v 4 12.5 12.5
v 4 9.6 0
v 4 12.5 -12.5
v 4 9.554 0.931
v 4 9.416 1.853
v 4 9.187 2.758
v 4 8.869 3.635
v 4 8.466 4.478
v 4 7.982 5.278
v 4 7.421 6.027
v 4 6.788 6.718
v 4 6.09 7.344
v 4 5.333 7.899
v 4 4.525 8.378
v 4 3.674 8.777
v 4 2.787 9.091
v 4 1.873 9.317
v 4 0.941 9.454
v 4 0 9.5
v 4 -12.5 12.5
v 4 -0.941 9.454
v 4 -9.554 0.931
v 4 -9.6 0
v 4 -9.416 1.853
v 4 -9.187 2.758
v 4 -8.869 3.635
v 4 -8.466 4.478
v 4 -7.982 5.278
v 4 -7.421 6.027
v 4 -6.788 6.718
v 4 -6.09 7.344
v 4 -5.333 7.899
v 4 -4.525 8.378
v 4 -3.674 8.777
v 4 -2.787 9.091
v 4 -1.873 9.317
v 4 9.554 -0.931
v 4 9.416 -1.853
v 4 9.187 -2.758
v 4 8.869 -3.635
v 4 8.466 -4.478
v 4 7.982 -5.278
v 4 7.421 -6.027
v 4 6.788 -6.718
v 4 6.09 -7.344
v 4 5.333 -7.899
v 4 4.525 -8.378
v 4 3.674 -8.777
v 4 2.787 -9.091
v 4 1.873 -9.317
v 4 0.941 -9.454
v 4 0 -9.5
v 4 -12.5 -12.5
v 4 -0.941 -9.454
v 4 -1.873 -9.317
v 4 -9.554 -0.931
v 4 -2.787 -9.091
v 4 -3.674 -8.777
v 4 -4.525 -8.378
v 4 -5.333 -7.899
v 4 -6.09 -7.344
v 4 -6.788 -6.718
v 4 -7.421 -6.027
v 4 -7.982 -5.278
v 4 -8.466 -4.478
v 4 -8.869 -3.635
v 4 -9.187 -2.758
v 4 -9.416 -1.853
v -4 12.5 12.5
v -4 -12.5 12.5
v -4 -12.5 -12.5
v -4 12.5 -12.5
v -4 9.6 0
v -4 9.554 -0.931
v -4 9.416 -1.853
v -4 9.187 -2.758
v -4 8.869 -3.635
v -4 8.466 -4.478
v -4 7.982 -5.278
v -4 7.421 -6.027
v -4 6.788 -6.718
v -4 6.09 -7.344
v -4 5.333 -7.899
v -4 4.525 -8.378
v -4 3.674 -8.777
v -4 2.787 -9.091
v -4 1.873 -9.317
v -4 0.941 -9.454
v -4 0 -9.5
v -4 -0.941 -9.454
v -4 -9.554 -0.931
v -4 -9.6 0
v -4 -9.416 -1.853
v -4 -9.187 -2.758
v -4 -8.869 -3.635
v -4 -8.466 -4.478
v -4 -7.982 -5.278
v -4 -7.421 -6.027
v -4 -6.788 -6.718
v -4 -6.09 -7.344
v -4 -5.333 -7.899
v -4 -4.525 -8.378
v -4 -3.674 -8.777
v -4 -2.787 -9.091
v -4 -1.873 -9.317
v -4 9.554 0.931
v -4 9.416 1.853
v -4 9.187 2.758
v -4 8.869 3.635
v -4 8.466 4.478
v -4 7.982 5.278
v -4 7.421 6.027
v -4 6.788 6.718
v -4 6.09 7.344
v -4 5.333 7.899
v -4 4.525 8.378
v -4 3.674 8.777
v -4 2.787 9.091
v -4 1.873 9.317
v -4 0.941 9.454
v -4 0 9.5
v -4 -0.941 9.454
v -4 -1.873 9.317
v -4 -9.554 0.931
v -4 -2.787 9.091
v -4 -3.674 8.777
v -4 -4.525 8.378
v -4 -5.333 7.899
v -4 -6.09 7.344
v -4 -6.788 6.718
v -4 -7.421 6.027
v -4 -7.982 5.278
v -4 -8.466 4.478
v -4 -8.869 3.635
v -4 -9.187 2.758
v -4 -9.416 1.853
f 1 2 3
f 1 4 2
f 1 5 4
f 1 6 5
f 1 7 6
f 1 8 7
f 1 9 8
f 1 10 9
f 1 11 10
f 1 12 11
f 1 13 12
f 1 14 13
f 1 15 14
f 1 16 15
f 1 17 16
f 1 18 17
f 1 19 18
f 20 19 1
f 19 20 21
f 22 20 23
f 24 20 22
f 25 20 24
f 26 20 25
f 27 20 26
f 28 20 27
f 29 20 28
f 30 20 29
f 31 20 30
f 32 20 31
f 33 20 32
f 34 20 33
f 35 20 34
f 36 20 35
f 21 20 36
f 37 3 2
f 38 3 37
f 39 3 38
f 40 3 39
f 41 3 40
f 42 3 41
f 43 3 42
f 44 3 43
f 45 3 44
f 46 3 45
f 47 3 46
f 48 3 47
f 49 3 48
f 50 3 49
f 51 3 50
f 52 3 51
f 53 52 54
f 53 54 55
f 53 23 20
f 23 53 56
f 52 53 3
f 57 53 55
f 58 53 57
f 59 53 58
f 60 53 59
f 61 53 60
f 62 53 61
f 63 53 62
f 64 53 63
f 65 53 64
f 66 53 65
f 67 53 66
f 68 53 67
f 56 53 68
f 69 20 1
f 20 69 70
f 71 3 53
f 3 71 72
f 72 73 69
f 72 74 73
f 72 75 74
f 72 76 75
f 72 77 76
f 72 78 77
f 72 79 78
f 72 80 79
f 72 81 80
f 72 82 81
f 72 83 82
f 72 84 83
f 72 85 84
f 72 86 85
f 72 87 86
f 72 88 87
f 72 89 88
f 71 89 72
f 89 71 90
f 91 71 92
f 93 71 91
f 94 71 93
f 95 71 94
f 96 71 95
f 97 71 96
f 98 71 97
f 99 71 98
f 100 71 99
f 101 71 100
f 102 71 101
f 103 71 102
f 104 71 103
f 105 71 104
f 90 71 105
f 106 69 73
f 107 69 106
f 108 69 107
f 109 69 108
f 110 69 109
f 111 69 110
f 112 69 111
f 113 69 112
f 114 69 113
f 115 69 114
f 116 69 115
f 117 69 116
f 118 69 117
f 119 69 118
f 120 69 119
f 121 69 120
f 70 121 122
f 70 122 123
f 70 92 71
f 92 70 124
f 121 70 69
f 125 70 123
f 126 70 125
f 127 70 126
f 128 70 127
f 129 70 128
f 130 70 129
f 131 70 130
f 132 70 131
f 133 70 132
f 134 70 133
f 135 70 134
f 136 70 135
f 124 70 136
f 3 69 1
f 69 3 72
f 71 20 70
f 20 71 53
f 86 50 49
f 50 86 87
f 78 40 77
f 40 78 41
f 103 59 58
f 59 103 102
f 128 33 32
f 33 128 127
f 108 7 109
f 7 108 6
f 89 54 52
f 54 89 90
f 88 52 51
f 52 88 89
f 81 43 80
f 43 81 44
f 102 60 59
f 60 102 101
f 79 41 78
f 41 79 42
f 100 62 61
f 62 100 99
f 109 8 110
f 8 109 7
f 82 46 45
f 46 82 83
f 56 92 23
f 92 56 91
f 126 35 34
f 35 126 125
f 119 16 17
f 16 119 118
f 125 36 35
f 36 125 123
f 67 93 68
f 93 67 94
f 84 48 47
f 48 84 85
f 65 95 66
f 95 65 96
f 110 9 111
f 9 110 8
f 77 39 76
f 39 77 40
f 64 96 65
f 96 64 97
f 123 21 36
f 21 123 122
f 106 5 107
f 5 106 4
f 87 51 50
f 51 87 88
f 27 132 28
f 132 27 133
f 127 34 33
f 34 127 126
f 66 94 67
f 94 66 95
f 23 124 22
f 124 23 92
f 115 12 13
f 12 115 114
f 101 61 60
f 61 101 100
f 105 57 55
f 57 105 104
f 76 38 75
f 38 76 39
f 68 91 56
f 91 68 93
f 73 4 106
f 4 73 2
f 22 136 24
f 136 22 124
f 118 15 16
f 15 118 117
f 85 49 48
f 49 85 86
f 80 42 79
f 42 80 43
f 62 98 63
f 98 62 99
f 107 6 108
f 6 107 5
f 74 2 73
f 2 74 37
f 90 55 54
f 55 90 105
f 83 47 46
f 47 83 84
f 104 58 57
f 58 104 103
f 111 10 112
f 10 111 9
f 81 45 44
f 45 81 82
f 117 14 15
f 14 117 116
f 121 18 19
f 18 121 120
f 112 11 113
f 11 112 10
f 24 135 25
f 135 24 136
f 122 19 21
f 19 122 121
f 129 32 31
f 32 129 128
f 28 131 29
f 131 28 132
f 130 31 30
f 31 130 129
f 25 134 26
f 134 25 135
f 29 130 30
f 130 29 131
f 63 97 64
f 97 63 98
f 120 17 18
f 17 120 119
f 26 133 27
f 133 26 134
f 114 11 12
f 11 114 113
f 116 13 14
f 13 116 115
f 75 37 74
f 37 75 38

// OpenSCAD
R6_LM6LUU   =   ["RODTYPE", 6.0,  false, 12.0, 35.0];
R8_LM8LUU   =   ["RODTYPE", 8.0,  false, 15.0, 45.0];
R10_LM10LUU =   ["RODTYPE", 10.0, false, 19.0, 55.0];
R10_Printed =   ["RODTYPE", 10.0, true,  0,    12.0];
R12_LM12LUU =   ["RODTYPE", 12.0, false, 21.0, 57.0];

function rodtype_diameter_nominal(t) = t[1];
function rodtype_is_printed_bearing(t) = t[2];
function rodtype_bearing_diameter(t) = t[3];
function rodtype_bearing_length(t) = t[4];

bearing_wall = 3;
sz = rodtype_bearing_diameter(R10_LM10LUU) + 2*bearing_wall;

difference()
{
    cube([8,sz,sz],center=true);
    
    scale([1,(rodtype_bearing_diameter(R10_LM10LUU)+0.2)/rodtype_bearing_diameter(R10_LM10LUU),1])
    rotate([0,90,0])
    cylinder(d=rodtype_bearing_diameter(R10_LM10LUU),h=10,center=true,$fn=64);
    
    //translate([0,0,rodtype_bearing_diameter(R10_LM10LUU)/2])
    //cube([10,rodtype_bearing_diameter(R10_LM10LUU)*0.7,rodtype_bearing_diameter(R10_LM10LUU)],center=true);
}
